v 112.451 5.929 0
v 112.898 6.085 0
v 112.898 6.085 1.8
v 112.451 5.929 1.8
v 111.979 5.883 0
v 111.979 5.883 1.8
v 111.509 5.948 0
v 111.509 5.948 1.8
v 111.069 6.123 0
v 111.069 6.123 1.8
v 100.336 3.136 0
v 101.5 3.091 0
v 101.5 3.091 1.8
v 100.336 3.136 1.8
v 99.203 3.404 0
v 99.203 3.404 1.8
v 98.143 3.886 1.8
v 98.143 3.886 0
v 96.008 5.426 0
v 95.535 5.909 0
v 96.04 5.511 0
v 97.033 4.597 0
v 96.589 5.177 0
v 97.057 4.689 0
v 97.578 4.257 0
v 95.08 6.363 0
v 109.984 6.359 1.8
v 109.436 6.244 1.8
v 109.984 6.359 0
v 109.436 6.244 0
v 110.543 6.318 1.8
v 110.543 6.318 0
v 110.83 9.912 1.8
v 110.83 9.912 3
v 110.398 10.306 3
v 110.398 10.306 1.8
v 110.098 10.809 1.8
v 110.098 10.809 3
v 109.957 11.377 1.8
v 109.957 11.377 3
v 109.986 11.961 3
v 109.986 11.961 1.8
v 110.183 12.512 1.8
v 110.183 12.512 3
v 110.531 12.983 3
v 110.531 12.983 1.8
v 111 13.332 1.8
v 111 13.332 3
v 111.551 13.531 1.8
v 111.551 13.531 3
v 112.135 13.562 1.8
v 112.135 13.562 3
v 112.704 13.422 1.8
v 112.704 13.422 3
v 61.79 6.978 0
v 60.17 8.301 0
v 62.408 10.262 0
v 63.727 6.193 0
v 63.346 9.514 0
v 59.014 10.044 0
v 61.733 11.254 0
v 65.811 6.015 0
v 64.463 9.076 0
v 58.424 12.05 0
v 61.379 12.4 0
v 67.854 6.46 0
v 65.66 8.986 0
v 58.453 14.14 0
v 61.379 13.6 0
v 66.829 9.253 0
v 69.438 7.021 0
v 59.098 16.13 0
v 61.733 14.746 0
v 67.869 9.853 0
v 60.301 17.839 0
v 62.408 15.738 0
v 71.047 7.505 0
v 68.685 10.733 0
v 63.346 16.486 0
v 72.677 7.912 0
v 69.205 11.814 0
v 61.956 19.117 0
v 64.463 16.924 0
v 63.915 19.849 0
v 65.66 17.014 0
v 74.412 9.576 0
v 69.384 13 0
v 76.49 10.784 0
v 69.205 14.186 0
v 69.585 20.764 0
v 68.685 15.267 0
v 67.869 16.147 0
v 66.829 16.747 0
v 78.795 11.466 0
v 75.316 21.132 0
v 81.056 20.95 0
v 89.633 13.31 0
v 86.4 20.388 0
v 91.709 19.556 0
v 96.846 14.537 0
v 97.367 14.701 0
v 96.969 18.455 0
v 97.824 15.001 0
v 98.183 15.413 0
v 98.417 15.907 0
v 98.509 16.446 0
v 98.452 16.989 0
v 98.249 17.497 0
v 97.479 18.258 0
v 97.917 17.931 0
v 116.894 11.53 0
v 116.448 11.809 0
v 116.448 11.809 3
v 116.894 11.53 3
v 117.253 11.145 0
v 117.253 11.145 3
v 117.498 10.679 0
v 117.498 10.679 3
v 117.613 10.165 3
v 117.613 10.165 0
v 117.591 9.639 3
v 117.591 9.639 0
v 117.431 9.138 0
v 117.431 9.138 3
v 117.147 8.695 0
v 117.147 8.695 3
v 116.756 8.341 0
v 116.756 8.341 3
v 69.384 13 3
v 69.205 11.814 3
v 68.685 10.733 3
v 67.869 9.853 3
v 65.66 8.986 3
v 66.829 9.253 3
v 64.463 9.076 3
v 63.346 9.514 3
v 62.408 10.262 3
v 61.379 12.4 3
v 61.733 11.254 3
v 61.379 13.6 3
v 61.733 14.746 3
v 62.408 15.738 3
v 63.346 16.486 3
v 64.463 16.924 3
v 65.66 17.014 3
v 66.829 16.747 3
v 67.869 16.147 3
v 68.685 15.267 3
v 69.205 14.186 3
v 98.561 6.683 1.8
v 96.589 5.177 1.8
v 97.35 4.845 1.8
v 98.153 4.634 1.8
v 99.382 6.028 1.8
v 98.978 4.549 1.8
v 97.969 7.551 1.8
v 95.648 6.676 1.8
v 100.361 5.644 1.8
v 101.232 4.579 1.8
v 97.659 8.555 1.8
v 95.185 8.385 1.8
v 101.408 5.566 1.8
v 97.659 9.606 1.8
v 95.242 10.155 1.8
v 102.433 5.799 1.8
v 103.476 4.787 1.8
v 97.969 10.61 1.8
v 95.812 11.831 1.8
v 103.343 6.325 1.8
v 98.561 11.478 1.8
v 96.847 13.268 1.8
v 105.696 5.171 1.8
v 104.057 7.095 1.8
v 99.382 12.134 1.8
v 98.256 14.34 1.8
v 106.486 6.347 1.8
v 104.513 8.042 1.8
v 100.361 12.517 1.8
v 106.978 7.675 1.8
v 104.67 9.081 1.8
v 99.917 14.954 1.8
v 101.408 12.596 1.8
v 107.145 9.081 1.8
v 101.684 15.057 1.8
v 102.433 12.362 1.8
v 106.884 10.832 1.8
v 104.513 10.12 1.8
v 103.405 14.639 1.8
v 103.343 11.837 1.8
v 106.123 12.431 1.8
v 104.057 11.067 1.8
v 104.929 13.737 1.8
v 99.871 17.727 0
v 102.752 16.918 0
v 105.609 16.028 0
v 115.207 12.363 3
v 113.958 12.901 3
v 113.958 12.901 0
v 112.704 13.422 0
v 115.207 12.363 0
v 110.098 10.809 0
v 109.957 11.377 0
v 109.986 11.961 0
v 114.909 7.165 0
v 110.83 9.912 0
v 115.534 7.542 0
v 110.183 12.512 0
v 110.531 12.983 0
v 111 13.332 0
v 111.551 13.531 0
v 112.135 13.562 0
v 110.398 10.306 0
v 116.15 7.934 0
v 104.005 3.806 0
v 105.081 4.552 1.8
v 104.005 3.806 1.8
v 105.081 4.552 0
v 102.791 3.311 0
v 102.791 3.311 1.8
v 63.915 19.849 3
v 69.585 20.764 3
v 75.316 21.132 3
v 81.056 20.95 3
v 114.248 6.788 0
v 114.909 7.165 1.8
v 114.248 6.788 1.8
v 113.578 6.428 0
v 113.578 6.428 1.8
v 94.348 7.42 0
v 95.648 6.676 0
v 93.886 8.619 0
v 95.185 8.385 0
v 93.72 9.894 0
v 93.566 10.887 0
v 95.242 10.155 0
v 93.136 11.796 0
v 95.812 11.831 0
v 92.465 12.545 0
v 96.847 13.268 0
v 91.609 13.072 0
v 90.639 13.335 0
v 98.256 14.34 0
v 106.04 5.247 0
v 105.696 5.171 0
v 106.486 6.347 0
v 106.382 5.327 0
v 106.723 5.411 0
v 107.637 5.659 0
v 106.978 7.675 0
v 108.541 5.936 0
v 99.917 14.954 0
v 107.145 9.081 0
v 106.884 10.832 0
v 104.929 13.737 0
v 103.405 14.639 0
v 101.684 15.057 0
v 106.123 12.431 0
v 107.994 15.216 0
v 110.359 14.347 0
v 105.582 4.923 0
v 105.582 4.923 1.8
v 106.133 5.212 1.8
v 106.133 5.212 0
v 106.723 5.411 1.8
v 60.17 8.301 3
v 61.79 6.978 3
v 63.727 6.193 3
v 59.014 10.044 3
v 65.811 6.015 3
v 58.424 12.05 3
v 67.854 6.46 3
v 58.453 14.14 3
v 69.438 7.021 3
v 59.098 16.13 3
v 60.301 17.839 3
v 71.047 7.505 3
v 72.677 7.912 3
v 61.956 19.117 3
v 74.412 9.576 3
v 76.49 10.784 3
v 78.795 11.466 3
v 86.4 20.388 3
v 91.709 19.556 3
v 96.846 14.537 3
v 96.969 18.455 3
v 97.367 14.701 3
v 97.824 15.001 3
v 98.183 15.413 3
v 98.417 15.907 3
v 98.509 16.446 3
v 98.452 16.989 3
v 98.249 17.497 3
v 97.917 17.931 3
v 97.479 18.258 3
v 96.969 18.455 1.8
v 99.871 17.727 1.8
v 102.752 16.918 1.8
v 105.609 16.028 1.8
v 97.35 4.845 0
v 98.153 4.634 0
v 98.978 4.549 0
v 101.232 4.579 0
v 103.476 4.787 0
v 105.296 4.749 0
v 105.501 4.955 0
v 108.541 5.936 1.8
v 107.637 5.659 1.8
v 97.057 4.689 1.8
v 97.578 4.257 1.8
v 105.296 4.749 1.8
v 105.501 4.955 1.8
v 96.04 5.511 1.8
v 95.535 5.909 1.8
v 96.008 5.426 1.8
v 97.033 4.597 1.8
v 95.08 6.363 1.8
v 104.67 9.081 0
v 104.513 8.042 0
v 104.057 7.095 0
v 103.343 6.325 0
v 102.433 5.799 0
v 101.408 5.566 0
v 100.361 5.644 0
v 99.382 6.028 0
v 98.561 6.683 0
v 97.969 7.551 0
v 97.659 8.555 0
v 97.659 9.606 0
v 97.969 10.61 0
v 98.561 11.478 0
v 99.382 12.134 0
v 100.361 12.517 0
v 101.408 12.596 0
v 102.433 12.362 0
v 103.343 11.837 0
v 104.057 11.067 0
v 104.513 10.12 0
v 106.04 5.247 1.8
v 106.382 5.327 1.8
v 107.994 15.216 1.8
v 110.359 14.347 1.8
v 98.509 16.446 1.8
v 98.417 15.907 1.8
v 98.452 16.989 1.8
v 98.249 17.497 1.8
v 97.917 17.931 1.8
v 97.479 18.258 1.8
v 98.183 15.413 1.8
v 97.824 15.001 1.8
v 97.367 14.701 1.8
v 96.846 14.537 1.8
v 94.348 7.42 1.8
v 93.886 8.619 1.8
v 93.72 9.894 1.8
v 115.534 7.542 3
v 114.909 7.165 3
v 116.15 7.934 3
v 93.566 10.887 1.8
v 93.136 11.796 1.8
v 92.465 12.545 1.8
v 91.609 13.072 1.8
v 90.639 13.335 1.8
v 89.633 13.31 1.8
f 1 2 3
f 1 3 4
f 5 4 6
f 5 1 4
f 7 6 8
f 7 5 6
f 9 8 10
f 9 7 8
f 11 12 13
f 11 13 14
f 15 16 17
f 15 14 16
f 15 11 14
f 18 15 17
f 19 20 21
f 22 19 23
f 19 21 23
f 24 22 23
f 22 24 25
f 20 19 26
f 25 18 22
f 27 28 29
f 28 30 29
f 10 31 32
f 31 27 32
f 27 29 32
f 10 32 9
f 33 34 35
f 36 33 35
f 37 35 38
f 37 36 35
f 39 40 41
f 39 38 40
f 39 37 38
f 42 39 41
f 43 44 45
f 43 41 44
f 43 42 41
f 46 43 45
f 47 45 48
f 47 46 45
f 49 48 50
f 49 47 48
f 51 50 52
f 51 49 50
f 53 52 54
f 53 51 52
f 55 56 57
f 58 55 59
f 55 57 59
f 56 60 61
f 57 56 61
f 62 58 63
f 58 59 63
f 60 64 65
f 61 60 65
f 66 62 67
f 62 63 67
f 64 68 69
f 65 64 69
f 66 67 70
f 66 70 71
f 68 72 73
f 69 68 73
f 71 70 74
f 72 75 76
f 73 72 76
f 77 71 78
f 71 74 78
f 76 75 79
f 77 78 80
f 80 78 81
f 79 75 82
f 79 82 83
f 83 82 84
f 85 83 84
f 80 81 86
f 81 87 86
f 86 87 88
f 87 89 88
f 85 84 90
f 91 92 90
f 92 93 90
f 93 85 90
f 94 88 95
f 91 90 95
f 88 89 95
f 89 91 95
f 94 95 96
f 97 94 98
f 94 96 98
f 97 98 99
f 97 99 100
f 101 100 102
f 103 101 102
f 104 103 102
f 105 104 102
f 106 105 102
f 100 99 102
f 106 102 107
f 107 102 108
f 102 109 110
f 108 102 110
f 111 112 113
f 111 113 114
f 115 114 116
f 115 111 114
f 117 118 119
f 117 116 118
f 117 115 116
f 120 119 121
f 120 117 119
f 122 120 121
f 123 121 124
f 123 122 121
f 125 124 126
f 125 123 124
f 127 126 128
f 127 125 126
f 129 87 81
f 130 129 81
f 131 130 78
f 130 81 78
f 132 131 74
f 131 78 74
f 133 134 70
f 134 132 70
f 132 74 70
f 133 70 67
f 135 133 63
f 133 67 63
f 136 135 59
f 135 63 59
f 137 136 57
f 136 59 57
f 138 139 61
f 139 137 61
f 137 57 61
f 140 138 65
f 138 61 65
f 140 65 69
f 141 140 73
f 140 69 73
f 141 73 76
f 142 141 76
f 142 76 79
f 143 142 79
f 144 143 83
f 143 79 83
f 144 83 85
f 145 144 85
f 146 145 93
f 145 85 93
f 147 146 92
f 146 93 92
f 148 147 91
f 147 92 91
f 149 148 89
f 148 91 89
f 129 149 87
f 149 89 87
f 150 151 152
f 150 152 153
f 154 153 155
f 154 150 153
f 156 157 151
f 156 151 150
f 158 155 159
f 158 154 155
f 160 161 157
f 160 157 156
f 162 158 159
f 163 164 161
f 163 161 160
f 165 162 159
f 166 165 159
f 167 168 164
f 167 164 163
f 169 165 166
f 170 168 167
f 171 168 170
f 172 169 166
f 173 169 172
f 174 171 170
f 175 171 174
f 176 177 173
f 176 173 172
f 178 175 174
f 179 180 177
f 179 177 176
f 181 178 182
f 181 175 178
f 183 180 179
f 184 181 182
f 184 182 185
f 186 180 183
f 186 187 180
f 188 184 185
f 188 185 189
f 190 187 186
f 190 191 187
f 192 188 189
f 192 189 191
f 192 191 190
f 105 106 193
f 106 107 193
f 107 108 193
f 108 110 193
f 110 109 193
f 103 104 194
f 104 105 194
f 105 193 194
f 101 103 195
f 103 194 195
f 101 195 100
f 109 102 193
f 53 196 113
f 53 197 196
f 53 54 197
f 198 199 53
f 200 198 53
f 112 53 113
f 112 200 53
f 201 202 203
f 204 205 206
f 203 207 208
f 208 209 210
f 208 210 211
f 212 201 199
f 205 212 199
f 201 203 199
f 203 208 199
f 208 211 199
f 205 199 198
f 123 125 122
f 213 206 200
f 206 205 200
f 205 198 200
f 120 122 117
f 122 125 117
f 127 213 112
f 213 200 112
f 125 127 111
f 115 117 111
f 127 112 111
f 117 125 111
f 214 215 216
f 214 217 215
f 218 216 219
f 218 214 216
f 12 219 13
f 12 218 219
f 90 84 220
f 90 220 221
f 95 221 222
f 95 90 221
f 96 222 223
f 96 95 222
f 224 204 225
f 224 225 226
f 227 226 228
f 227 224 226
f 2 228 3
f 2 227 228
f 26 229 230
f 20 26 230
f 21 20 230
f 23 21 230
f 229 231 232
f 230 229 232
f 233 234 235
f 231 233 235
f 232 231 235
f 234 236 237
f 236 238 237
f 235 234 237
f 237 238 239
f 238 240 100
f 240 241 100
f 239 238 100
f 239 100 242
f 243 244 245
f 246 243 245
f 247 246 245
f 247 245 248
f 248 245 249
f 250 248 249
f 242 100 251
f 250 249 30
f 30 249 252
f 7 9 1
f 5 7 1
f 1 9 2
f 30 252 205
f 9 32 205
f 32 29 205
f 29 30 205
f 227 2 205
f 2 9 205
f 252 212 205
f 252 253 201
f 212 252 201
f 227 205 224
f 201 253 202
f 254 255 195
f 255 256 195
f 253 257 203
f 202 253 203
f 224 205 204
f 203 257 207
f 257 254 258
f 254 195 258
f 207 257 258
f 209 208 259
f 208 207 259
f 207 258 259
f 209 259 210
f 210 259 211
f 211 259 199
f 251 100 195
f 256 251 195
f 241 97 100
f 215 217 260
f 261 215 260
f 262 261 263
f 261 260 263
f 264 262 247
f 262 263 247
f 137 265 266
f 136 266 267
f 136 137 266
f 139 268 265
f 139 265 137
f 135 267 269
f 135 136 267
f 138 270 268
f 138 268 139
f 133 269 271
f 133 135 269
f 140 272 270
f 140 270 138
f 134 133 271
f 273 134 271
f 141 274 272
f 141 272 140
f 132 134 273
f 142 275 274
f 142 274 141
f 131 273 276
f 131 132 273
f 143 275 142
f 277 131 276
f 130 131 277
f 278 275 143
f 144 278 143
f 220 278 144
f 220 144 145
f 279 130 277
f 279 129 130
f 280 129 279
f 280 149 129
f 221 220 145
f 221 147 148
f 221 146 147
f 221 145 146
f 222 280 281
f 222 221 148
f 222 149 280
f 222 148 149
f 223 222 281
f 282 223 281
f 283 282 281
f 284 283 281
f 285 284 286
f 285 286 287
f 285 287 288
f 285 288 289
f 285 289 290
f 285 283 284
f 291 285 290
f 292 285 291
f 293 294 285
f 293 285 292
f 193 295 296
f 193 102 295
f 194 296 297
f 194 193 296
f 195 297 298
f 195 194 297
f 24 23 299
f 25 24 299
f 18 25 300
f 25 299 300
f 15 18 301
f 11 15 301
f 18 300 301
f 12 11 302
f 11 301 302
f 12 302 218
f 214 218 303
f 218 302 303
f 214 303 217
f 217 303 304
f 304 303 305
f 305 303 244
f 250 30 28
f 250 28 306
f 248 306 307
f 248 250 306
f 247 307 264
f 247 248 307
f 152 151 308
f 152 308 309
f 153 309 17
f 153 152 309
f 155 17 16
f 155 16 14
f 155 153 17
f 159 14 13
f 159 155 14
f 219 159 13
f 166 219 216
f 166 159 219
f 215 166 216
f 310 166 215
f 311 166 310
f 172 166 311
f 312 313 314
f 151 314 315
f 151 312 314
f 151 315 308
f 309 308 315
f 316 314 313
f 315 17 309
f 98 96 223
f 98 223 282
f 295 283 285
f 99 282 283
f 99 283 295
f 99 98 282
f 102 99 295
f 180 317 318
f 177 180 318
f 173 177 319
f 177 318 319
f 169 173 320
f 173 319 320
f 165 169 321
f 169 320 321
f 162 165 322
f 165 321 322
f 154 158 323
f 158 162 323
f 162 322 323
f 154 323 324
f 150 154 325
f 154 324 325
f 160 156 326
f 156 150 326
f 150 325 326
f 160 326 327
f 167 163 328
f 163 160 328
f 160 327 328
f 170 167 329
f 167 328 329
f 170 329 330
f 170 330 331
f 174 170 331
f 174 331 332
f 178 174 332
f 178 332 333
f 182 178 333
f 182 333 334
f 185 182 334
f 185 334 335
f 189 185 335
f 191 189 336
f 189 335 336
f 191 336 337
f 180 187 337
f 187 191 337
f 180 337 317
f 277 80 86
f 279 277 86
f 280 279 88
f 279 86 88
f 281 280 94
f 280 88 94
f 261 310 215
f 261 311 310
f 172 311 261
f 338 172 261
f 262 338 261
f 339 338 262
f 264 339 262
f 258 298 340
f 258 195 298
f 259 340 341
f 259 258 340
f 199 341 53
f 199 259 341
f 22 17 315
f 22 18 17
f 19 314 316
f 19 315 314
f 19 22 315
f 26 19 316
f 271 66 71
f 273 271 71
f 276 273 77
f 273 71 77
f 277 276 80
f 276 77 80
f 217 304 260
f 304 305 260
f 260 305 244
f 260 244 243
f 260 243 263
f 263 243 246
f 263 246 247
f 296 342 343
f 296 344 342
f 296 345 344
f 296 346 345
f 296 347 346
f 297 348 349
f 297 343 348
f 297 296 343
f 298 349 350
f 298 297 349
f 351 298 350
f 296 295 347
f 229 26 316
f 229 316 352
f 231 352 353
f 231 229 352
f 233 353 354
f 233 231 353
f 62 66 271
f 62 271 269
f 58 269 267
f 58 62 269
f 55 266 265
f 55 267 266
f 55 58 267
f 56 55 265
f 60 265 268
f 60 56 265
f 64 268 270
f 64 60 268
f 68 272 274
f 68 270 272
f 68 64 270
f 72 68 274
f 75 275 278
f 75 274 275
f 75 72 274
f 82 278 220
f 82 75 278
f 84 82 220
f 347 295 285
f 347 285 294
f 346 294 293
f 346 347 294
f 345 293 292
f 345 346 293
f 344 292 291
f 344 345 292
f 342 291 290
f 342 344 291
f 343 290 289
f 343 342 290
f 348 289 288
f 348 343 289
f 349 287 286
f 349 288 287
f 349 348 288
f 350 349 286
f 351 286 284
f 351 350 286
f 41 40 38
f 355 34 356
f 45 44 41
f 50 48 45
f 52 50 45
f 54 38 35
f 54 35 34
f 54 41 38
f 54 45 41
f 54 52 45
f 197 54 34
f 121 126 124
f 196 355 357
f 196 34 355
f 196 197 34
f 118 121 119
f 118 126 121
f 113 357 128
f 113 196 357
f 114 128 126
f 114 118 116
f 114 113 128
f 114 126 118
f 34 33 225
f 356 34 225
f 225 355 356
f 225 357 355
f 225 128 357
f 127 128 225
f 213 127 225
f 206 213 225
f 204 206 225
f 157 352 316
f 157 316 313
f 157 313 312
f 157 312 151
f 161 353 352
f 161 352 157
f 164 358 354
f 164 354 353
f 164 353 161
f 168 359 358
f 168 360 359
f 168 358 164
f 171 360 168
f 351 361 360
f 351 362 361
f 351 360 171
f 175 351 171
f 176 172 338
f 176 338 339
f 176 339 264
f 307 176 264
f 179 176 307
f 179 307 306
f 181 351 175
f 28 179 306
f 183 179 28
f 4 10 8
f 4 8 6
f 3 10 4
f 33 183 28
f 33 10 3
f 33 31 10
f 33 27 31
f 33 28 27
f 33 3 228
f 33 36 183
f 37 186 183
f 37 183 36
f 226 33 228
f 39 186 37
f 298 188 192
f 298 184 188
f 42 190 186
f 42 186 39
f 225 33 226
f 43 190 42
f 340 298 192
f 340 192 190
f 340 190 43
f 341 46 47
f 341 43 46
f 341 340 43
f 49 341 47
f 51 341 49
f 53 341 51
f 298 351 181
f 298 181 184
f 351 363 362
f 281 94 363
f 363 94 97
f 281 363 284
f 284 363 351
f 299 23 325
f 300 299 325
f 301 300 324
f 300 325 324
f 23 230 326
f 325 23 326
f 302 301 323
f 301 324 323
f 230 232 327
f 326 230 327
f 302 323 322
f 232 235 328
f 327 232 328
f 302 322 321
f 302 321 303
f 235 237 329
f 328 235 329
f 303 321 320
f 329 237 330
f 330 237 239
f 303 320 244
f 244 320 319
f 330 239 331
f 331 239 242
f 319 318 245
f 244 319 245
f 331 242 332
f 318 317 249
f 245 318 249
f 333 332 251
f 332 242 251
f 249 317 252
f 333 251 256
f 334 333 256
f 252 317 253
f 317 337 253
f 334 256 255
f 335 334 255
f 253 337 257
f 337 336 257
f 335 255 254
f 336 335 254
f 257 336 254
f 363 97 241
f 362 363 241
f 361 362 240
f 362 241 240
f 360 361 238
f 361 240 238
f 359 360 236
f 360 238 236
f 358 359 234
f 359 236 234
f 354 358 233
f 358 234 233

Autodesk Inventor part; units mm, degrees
ref_plane "YZ Plane" through (0, 0, 0) normal (1, 0, 0) x (0, 1, 0)
ref_plane "XZ Plane" through (0, 0, 0) normal (0, 1, 0) x (-1, 0, 0)
ref_plane "XY Plane" through (0, 0, 0) normal (0, 0, 1) x (1, 0, 0)
sketch "Sketch1" plane through (0, 0, 0) normal (0, 0, 1) x (1, 0, 0)
  line L0 (65.359, 13) -> (101.145, 9.0808) construction
  circle A0 centre (65.359, 13) radius 3 construction
  circle A1 centre (65.359, 13) radius 4.025
  circle A2 centre (65.359, 13) radius 7
  arc A3 (103.9065, 14.4076) -> (101.5853, 15.5481) centre (76.292, -38.8601) ccw construction
  arc A4 (98.0987, 3.9117) -> (67.8539, 6.4597) centre (80.3286, -26.2417) ccw
  circle A5 centre (101.145, 9.0808) radius 2.5 construction
  circle A6 centre (101.145, 9.0808) radius 3.525
  circle A7 centre (101.145, 9.0808) radius 6
  line L1 (101.145, 9.0808) -> (116.8532, -6.3223) construction
  circle A8 centre (116.8532, -6.3223) radius 10 construction
  circle A9 centre (116.8532, -6.3223) radius 7.025 construction
  line L2 (104.4969, 14.0572) -> (122.4397, 1.9718) construction
  line L3 (96.2353, 5.6319) -> (108.6703, -12.0703) construction
  line L4 (121.8748, 2.4728) -> (123.0794, 1.6615) construction
  arc A10 (101.4998, 3.0913) -> (116.7565, 8.3414) centre (99.726, 33.0388) ccw
  arc A11 (116.4477, 11.8091) -> (81.0555, 20.9505) centre (72.64, -84.7149) ccw
  arc A12 (116.7565, 8.3414) -> (116.4477, 11.8091) centre (115.6212, 9.9879) ccw
  line L5 (65.359, 13) -> (100, 0) construction
  arc A13 (112.7035, 13.4223) -> (110.8303, 9.9119) centre (111.9476, 11.5707) ccw
  line L6 (101.145, 9.0808) -> (80.4889, 1.5095) construction
  circle A14 centre (80.4889, 1.5095) radius 7.025 construction
  circle A15 centre (80.4889, 1.5095) radius 10 construction
  line L7 (110.8303, 9.9119) -> (114.9091, 7.1646)
  arc A16 (81.0555, 20.9505) -> (63.915, 19.8494) centre (76.292, -38.8601) ccw
  arc A17 (101.5853, 15.5481) -> (81.0555, 20.9505) centre (76.292, -38.8601) ccw construction
  line L8 (78.8119, 11.3678) -> (100.1388, 14.9958) construction
  line L9 (78.7951, 11.4664) -> (105.6086, 16.0277)
  arc A18 (78.7951, 11.4664) -> (72.6773, 7.9118) centre (80.4889, 1.5095) ccw
  circle A19 centre (108.9991, 1.3793) radius 2.85 construction
  arc A20 (98.9782, 4.5486) -> (109.436, 6.244) centre (99.726, 33.0388) ccw
  arc A21 (111.0687, 6.1229) -> (109.436, 6.244) centre (110.1175, 4.3636) ccw
  line L10 (111.3917, 5.9167) -> (113.93, 4.207) construction
  arc A22 (93.7202, 9.8939) -> (89.6334, 13.3102) centre (90.2203, 9.8597) ccw
  arc A23 (111.0687, 6.1229) -> (112.8982, 6.0853) centre (112.02, 7.8822) ccw
  arc A24 (96.8456, 14.537) -> (96.9692, 18.4553) centre (96.5101, 16.5087) ccw
  arc A25 (93.7202, 9.8939) -> (98.9782, 4.5486) centre (99.1199, 9.9468) ccw
  arc A26 (106.7234, 5.4112) -> (105.0813, 4.5525) centre (107.7055, 1.5336) ccw
  arc A27 (95.0804, 6.3632) -> (98.2329, 3.8349) centre (104.0571, 14.3267) ccw
  point P0 (0, 0)
  point P1 (104.5045, 16.3824)
  point P2 (75.0442, 8.3571)
  point P3 (105.6964, 5.1712)
  point P4 (95.4674, 18.798)
  point P5 (96.589, 5.1766)
  point P6 (97.8471, 4.0585)
  dimension "d10" = 12
  dimension "d57" = 20
  dimension "d1" = 8.05
  dimension "d2" = 6
  dimension "d3" = 14
  dimension "d4" = 60
  dimension "d5" = 35
  dimension "d8" = 22
  dimension "d11" = 7.05
  dimension "d12" = 20
  dimension "d13" = 14.05
  dimension "d15" = 0.1
  dimension "d16" = 30
  dimension "d17" = 5
  dimension "d18" = 2
  dimension "d19" = 106
  dimension "d21" = 121
  dimension "d46" = 13
  dimension "d47" = 37
  dimension "d48" = 18
  dimension "d50" = 0
  dimension "d51" = 100
  dimension "d53" = 2
  dimension "d54" = 4
  dimension "d55" = 22
  dimension "d56" = 14.05
  dimension "d65" = 14.32
  dimension "d68" = 26.38
  dimension "d69" = 0.1
  dimension "d70" = 0.1
  dimension "d72" = 36
  dimension "d77" = 5.7
  dimension "d78" = 2
  dimension "d79" = 3
  dimension "d86" = 1.5
  dimension "d87" = 2
  dimension "d88" = 2
  dimension "d90" = 5.4
  dimension "d91" = 3.5
  dimension "d92" = 4
  dimension "d93" = 12
extrude "Extrusion7" add sketch "Sketch1" along normal blind 3 contours A2 | A2 A16 A11 A24 L9 A18 A4 | A11 A12 A10 L7 A13
extrude "Extrusion8" add sketch "Sketch1" along normal blind 1.8 contours A11 L9 A24 | A7 A25 A20 | A27 A25 A7 | A11 A13 L7 A10 A23 A21 A20 A7 A25 A22 L9 | A7 A20 A25 | A7 A20 A26
sketch "Sketch4" plane through (0, 0, 3) normal (0, 0, 1) x (1, 0, 0)
  arc A0 (96.8456, 14.537) -> (96.9692, 18.4553) centre (96.5101, 16.5087) ccw projected
  circle A1 centre (65.359, 13) radius 4.025 projected
  arc A2 (112.7035, 13.4223) -> (96.9692, 18.4553) centre (72.64, -84.7149) ccw construction
  arc A3 (96.8456, 14.537) -> (96.9692, 18.4553) centre (96.5101, 16.5087) ccw projected
  line L0 (89.6334, 13.3102) -> (96.8456, 14.537) projected
  arc A4 (93.7202, 9.8939) -> (89.6334, 13.3102) centre (90.2203, 9.8597) ccw construction
  arc A5 (93.7202, 9.8939) -> (95.0804, 6.3632) centre (99.1199, 9.9468) ccw construction
  arc A6 (95.0804, 6.3632) -> (97.8471, 4.0585) centre (104.0571, 14.3267) ccw construction
  arc A7 (98.0987, 3.9117) -> (97.8471, 4.0585) centre (80.3286, -26.2417) ccw construction
  arc A8 (98.0987, 3.9117) -> (105.0813, 4.5525) centre (101.145, 9.0808) ccw construction
  arc A9 (106.7234, 5.4112) -> (105.0813, 4.5525) centre (107.7055, 1.5336) ccw construction
  arc A10 (106.7234, 5.4112) -> (109.436, 6.244) centre (99.726, 33.0388) ccw construction
  arc A11 (111.0687, 6.1229) -> (109.436, 6.244) centre (110.1175, 4.3636) ccw construction
  arc A12 (111.0687, 6.1229) -> (112.8982, 6.0853) centre (112.02, 7.8822) ccw construction
  arc A13 (112.8982, 6.0853) -> (114.9091, 7.1646) centre (99.726, 33.0388) ccw construction
  line L1 (110.8303, 9.9119) -> (114.9091, 7.1646) projected
  arc A14 (112.7035, 13.4223) -> (110.8303, 9.9119) centre (111.9476, 11.5707) ccw projected
  circle A15 centre (101.145, 9.0808) radius 3.525 projected
  arc A16 (112.7035, 13.4223) -> (110.8303, 9.9119) centre (111.9476, 11.5707) ccw projected
  line L2 (110.8303, 9.9119) -> (114.9091, 7.1646) projected
  line L3 (110.8303, 9.9119) -> (114.9091, 7.1646) projected
  arc A17 (89.6334, 13.3102) -> (88.9291, 11.8348) centre (89.8011, 12.3243) ccw
  arc A18 (88.9291, 11.8348) -> (114.8991, 5.4992) centre (104.8698, 20.7826) ccw
  arc A19 (114.8991, 5.4992) -> (114.9091, 7.1646) centre (114.3504, 6.3352) ccw
  arc A20 (112.7035, 13.4223) -> (96.9692, 18.4553) centre (72.64, -84.7149) ccw projected
  arc A21 (97.5034, 20.3811) -> (96.9692, 18.4553) centre (97.1987, 19.4286) ccw
  arc A22 (112.7035, 13.4223) -> (113.3862, 15.3006) centre (113.0815, 14.3482) ccw
  line L4 (97.5034, 20.3811) -> (113.3862, 15.3006)
  arc A23 (112.7035, 13.4223) -> (110.8303, 9.9119) centre (111.9476, 11.5707) ccw projected
  arc A24 (96.8456, 14.537) -> (96.9692, 18.4553) centre (96.5101, 16.5087) ccw projected
  arc A25 (93.7202, 9.8939) -> (89.6334, 13.3102) centre (90.2203, 9.8597) ccw projected
  line L5 (89.6334, 13.3102) -> (96.8456, 14.537)
  line L6 (89.6334, 13.3102) -> (96.8456, 14.537)
  circle A26 centre (65.359, 13) radius 4.025 projected
  circle A27 centre (101.145, 9.0808) radius 3.525 projected
  arc A28 (116.4477, 11.8091) -> (81.0555, 20.9505) centre (72.64, -84.7149) ccw projected
  arc A29 (116.7565, 8.3414) -> (116.4477, 11.8091) centre (115.6212, 9.9879) ccw projected
  arc A30 (112.8982, 6.0853) -> (116.7565, 8.3414) centre (99.726, 33.0388) ccw projected
  arc A31 (111.0687, 6.1229) -> (112.8982, 6.0853) centre (112.02, 7.8822) ccw projected
  arc A32 (111.0687, 6.1229) -> (109.436, 6.244) centre (110.1175, 4.3636) ccw projected
  arc A33 (106.7234, 5.4112) -> (109.436, 6.244) centre (99.726, 33.0388) ccw projected
  arc A34 (106.7234, 5.4112) -> (105.0813, 4.5525) centre (107.7055, 1.5336) ccw projected
  arc A35 (98.0987, 3.9117) -> (105.0813, 4.5525) centre (101.145, 9.0808) ccw projected
  arc A36 (98.0987, 3.9117) -> (97.8471, 4.0585) centre (80.3286, -26.2417) ccw projected
  arc A37 (95.0804, 6.3632) -> (97.8471, 4.0585) centre (104.0571, 14.3267) ccw projected
  arc A38 (93.7202, 9.8939) -> (95.0804, 6.3632) centre (99.1199, 9.9468) ccw projected
  arc A39 (93.7202, 9.8939) -> (89.6334, 13.3102) centre (90.2203, 9.8597) ccw projected
  line L7 (78.7951, 11.4664) -> (89.6334, 13.3102) projected
  arc A40 (78.7951, 11.4664) -> (72.6773, 7.9118) centre (80.4889, 1.5095) ccw projected
  arc A41 (72.6773, 7.9118) -> (67.8539, 6.4597) centre (80.3286, -26.2417) ccw projected
  arc A42 (63.915, 19.8494) -> (67.8539, 6.4597) centre (65.359, 13) ccw projected
  arc A43 (81.0555, 20.9505) -> (63.915, 19.8494) centre (76.292, -38.8601) ccw projected
  point P0 (0, 0)
  dimension "d94" = 1
  dimension "d95" = 1
  dimension "d96" = 1
  dimension "d97" = 1
properties part number "揺動節" material "アルミニウム 7075"
